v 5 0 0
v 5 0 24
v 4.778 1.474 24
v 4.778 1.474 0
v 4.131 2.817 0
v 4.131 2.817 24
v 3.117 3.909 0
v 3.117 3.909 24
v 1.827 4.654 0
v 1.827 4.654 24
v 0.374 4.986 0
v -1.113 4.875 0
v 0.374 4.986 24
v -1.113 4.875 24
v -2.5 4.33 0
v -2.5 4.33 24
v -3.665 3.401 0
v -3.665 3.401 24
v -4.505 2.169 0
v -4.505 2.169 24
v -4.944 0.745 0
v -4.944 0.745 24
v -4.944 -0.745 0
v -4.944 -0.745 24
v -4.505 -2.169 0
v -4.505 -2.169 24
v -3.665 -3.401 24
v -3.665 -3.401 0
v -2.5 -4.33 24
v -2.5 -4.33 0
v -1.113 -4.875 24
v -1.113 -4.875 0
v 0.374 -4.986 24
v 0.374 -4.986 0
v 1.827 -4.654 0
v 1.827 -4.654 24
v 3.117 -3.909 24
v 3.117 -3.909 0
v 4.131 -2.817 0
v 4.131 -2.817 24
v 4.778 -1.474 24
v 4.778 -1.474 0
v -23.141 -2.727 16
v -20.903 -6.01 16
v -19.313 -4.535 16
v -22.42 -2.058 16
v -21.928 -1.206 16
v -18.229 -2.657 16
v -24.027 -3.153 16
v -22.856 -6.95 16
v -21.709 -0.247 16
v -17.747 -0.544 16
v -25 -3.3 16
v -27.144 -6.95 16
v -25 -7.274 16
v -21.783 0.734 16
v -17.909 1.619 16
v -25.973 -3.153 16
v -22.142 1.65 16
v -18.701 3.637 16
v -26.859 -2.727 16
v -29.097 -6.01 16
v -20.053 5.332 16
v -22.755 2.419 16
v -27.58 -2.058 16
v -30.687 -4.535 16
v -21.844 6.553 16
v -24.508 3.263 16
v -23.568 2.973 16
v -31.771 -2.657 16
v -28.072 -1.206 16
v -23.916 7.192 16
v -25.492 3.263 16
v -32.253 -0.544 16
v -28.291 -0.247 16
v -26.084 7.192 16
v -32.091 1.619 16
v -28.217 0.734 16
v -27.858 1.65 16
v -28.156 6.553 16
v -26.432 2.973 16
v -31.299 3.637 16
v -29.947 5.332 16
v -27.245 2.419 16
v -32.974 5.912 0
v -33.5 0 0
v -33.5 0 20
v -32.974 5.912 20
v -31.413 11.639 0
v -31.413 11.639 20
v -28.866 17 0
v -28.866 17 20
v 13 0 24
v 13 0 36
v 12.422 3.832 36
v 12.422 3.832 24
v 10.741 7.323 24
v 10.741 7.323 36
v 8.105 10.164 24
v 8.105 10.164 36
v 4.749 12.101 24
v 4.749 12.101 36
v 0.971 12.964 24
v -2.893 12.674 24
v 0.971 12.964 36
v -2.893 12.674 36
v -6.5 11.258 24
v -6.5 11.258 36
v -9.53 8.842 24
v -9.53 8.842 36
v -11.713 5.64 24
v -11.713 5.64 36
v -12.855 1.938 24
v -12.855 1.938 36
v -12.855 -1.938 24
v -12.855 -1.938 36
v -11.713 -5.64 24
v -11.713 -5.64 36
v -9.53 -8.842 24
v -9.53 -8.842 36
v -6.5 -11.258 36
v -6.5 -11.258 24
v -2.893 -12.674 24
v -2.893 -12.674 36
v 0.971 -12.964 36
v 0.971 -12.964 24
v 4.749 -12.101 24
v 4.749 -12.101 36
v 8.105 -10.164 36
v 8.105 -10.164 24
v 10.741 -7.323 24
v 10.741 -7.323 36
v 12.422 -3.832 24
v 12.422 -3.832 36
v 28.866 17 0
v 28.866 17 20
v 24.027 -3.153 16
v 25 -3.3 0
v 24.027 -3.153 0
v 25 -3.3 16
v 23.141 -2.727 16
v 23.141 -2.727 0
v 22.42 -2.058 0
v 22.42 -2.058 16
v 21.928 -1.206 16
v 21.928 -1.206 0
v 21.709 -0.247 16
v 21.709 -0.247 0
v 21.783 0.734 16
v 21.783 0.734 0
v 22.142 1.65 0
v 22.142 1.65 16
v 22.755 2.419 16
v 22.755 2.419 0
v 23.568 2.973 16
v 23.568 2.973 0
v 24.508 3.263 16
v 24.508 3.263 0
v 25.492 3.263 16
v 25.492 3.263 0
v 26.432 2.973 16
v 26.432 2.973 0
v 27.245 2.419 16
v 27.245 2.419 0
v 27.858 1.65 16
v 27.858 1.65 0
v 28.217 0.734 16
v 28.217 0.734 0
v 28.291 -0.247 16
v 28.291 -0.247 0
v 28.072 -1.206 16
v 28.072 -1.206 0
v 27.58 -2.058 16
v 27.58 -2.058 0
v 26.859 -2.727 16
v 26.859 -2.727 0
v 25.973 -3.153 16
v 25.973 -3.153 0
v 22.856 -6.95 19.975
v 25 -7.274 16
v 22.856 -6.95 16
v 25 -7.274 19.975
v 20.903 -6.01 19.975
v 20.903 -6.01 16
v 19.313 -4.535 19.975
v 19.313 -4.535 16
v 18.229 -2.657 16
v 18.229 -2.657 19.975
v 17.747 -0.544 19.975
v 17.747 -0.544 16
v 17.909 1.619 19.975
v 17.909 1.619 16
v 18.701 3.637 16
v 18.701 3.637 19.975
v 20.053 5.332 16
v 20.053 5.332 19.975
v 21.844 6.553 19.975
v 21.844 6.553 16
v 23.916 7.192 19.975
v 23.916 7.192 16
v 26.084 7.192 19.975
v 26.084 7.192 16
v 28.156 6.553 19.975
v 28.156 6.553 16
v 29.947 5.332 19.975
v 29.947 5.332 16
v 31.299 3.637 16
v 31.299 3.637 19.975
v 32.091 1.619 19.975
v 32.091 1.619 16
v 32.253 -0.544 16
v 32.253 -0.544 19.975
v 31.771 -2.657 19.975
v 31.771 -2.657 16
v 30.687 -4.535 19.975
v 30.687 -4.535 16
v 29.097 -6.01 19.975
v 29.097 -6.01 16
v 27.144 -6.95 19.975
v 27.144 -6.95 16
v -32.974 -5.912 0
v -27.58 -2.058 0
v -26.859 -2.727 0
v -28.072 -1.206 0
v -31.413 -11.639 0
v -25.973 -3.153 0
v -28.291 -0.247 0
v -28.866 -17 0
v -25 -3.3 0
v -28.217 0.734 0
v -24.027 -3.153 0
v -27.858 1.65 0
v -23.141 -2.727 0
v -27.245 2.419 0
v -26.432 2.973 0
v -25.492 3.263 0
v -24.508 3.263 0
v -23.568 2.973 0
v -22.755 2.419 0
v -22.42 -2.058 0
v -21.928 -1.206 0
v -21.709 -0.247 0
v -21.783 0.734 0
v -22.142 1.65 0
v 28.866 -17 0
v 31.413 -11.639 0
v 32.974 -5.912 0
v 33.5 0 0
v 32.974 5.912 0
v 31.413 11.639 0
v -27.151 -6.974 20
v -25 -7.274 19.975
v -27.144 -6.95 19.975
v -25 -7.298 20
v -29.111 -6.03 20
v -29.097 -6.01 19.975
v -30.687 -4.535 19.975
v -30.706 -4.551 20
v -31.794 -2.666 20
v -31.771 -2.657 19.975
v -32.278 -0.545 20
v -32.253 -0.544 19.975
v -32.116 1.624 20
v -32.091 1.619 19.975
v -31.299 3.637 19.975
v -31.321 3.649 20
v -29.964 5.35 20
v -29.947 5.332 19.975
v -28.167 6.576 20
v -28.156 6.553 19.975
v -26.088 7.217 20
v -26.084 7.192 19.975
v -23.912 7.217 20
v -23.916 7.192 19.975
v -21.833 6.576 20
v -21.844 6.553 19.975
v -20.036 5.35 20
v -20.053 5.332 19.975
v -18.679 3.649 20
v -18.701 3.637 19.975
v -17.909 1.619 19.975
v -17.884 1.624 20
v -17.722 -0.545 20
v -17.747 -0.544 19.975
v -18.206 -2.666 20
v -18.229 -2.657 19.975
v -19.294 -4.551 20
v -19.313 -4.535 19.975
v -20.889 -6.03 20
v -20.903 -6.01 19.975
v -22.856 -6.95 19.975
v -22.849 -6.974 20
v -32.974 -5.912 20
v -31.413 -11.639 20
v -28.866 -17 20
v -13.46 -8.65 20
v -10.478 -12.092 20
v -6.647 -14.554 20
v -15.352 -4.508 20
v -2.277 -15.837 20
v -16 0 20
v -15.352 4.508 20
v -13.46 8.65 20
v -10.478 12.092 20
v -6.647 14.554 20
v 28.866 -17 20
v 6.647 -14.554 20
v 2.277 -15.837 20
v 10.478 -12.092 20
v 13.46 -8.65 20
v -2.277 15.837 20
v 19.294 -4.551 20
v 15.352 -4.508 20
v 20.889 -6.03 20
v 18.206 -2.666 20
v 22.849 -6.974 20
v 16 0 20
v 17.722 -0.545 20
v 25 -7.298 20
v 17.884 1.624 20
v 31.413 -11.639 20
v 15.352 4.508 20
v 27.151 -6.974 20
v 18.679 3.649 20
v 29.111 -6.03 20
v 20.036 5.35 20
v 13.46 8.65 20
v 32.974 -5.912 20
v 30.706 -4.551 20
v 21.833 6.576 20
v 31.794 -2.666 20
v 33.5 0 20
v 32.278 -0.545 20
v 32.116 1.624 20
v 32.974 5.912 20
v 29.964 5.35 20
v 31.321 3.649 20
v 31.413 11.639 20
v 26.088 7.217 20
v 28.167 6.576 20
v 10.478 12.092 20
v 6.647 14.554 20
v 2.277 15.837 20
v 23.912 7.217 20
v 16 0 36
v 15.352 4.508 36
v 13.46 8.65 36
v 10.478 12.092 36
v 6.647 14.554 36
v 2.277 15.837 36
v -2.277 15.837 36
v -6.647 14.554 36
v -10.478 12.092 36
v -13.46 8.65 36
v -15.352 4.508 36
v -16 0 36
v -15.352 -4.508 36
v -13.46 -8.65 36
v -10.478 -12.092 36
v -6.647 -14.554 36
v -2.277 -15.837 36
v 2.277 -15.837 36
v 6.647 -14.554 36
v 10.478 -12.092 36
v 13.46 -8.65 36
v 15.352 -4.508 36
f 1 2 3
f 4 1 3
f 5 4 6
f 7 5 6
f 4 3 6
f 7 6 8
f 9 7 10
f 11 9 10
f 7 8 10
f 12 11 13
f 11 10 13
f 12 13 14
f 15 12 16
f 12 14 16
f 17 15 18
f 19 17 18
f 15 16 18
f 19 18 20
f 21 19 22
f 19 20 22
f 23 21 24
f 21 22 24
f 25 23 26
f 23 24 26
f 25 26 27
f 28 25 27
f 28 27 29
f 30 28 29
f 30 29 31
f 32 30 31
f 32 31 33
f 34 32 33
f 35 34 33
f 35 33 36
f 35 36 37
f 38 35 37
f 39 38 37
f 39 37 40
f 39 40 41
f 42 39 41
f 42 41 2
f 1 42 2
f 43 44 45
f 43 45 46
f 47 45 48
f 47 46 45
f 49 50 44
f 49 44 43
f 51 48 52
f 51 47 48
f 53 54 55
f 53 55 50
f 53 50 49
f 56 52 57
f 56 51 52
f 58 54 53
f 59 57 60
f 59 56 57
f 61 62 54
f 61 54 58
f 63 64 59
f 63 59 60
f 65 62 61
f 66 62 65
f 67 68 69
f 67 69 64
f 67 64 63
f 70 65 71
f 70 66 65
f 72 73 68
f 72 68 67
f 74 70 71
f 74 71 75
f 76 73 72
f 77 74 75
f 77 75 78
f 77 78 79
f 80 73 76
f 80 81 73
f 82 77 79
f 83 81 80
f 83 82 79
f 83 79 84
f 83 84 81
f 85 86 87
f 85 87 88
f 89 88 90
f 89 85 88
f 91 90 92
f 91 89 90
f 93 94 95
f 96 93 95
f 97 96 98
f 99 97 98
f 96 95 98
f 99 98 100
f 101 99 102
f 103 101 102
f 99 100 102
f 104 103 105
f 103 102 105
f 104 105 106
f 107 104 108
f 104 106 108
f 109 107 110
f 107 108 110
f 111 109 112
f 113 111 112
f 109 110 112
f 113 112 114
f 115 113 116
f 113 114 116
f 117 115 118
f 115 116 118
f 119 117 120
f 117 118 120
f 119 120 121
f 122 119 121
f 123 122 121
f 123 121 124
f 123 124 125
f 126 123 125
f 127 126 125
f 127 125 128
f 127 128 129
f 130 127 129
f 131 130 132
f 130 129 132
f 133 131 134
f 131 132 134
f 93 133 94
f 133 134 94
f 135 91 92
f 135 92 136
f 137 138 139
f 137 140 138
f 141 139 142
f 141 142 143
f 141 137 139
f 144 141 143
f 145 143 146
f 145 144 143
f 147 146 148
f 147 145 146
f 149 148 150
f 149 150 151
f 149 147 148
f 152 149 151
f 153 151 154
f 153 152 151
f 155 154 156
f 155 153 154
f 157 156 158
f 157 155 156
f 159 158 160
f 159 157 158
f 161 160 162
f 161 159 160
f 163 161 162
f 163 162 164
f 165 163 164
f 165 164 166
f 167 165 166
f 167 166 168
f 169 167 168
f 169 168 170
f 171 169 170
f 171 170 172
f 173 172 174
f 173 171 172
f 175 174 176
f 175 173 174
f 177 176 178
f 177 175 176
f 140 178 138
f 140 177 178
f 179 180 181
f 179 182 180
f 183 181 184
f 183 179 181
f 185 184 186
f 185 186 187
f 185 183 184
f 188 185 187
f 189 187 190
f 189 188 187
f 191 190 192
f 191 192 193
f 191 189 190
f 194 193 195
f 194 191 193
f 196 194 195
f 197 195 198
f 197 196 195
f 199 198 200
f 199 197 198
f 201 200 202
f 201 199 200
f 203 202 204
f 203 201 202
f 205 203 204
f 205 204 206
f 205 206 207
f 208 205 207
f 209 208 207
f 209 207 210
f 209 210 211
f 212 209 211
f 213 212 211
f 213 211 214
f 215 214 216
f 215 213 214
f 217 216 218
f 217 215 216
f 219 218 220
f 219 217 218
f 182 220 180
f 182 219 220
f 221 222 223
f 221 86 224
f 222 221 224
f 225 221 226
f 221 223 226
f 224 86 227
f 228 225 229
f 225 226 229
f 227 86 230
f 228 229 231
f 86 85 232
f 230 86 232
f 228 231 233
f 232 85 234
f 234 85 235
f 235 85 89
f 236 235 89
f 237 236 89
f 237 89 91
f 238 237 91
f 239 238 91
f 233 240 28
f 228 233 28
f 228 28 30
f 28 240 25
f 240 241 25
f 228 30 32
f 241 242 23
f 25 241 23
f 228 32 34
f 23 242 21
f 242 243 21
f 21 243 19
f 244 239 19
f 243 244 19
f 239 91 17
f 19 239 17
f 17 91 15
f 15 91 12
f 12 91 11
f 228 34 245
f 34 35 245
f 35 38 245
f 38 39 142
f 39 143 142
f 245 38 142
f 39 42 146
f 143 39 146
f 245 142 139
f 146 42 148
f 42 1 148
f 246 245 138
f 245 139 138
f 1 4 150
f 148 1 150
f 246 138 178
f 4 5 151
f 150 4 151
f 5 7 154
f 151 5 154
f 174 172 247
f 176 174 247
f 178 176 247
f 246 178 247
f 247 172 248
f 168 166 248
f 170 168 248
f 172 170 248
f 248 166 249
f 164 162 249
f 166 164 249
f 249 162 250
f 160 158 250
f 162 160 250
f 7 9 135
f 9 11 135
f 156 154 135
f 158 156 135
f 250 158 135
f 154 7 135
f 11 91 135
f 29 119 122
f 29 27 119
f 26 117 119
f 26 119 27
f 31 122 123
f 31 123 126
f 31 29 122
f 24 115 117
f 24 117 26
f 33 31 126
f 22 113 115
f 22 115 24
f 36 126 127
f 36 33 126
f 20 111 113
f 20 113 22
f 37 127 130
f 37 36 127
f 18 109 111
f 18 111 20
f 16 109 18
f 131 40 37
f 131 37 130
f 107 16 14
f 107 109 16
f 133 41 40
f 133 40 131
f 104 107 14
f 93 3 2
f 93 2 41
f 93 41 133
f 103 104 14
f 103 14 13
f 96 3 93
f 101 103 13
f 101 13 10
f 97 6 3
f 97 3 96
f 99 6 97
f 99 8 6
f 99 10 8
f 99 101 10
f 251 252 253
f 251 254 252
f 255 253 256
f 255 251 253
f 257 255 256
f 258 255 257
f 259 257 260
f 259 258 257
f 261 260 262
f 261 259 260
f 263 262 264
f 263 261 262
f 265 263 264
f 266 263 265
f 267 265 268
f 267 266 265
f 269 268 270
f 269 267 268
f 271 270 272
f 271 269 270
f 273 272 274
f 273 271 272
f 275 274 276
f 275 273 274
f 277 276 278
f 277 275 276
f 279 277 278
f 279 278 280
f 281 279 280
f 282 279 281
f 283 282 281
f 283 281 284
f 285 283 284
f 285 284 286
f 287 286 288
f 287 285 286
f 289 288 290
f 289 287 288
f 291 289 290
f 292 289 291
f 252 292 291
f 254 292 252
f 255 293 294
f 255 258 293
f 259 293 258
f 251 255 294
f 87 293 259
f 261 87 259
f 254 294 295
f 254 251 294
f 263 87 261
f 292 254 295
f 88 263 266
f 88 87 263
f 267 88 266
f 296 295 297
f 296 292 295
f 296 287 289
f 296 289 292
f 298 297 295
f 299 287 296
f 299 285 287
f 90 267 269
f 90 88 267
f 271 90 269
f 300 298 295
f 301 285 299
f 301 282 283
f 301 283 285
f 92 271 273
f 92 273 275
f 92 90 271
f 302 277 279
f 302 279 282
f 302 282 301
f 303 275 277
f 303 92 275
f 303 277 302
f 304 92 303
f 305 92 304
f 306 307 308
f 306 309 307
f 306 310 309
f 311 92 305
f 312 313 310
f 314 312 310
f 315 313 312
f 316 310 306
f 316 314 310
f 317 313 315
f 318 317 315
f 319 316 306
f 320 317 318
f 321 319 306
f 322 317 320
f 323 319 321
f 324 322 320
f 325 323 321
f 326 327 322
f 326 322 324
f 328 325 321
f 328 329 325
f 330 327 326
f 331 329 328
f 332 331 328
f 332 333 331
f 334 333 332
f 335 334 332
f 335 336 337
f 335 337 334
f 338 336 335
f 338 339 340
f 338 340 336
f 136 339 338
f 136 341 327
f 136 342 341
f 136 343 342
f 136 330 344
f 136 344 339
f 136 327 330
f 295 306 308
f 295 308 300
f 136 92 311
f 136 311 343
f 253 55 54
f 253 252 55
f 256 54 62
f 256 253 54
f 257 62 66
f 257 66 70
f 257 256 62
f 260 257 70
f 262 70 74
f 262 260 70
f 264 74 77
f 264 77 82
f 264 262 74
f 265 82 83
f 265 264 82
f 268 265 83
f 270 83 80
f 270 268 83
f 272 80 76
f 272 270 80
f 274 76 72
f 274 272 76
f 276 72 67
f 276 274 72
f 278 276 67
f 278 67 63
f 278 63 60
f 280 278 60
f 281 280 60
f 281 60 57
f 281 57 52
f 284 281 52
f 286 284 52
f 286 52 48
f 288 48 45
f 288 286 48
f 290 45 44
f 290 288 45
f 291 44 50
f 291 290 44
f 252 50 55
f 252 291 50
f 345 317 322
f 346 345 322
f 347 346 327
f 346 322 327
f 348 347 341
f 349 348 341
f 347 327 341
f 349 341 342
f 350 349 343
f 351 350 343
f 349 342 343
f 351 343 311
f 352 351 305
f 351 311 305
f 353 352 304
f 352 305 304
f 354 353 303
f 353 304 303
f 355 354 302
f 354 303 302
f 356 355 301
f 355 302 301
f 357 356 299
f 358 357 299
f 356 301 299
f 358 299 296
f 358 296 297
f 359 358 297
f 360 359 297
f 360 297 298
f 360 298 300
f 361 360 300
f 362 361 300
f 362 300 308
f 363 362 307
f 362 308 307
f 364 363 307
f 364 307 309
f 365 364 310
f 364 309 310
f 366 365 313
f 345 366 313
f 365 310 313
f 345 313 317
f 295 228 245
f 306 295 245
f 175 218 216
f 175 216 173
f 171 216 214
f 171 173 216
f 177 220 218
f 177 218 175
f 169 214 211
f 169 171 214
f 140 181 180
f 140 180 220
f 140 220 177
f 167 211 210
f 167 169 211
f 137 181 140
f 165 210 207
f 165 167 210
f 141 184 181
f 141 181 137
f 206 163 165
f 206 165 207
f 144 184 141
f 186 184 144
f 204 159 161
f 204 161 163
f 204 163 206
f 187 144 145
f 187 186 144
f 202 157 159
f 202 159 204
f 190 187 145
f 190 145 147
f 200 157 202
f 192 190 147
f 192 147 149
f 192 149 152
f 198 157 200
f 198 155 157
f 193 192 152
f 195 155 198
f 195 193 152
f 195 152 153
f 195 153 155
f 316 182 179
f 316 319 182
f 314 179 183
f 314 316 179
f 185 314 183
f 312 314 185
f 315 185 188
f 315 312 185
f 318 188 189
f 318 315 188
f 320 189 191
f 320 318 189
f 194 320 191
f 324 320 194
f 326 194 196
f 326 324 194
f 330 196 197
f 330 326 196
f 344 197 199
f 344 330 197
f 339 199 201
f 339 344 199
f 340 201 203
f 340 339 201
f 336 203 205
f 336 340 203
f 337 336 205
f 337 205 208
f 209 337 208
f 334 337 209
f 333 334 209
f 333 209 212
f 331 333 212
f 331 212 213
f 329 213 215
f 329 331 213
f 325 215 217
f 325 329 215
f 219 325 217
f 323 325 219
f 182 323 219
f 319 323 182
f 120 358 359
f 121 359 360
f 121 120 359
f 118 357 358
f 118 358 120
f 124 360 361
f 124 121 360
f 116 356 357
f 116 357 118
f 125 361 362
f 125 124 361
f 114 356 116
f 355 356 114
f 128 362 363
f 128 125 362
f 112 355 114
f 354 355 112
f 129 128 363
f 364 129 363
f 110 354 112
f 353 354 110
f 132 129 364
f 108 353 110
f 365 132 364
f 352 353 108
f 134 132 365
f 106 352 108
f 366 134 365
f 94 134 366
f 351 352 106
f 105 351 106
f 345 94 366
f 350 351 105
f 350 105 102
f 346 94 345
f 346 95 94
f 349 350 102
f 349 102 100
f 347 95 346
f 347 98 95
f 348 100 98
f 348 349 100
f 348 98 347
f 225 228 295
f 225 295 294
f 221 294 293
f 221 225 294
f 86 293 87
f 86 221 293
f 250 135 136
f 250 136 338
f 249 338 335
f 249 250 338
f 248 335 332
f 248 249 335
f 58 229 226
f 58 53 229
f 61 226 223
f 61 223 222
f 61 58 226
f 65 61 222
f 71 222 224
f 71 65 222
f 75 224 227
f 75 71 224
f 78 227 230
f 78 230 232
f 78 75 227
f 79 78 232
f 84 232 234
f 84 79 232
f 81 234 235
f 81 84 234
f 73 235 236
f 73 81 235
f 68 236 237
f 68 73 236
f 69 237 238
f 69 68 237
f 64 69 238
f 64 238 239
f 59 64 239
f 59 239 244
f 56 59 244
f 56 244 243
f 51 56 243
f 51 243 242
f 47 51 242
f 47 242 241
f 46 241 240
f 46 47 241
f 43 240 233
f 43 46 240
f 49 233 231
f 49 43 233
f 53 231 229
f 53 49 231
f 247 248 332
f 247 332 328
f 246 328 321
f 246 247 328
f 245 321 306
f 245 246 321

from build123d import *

# Parameters (mm, degrees)
SKETCH1_W                              = 67
SKETCH1_H                              = 34
BOSS_EXTRUDE1_DEPTH                    = 20
CUT_EXTRUDE1_START                     = -20
CUT_EXTRUDE1_DEPTH                     = 20
SKETCH3_R                              = 16
BOSS_EXTRUDE2_DEPTH                    = 16
CBORE_FOR_M6_HEX_HEAD_BOLT1_AT_2_COUNT = 2
CBORE_FOR_M6_HEX_HEAD_BOLT1_AT_2_PITCH = 50
SKETCH9_R                              = 5
CUT_EXTRUDE2_DEPTH                     = 46
SKETCH10_R                             = 13
CUT_EXTRUDE3_DEPTH                     = 12


# Read off the part's stored shape, not the designer's step: Cut-Extrude1
with BuildPart() as part:
    # Sketch1 → Boss-Extrude1 (new body)
    with BuildSketch(Plane.XY):
        Rectangle(SKETCH1_W, SKETCH1_H)
    extrude(amount=BOSS_EXTRUDE1_DEPTH)

    # Cut-Extrude1 outline → Cut-Extrude1 (cut)
    with BuildSketch(Plane.XY.offset(20).offset(CUT_EXTRUDE1_START)):
        with BuildLine():
            ThreePointArc((-33.5, -3.1e-08), (-32.320762268, 8.810126358), (-28.866070048, 17))
            Line((-28.866070048, 17), (-33.5, 17))
            Line((-33.5, 17), (-33.5, -3.1e-08))
        make_face()
        with BuildLine():
            ThreePointArc((-28.866070048, -17), (-32.32076226, -8.810126387), (-33.5, -3.1e-08))
            Line((-33.5, -3.1e-08), (-33.5, -17))
            Line((-33.5, -17), (-28.866070048, -17))
        make_face()
        with BuildLine():
            Line((33.5, 17), (28.866070048, 17))
            ThreePointArc((28.866070048, 17), (32.32076226, 8.810126387), (33.5, 3.1e-08))
            Line((33.5, 3.1e-08), (33.5, 17))
        make_face()
        with BuildLine():
            Line((33.5, -17), (33.5, 3.1e-08))
            ThreePointArc((33.5, 3.1e-08), (32.320762268, -8.810126358), (28.866070048, -17))
            Line((28.866070048, -17), (33.5, -17))
        make_face()
    extrude(amount=CUT_EXTRUDE1_DEPTH, mode=Mode.SUBTRACT)

    # Sketch3 → Boss-Extrude2 (add)
    with BuildSketch(Plane.XY.offset(20)):
        Circle(SKETCH3_R)
    extrude(amount=BOSS_EXTRUDE2_DEPTH)

    # Sketch8 → CBORE for M6 Hex Head Bolt1 (revolve, cut)
    with BuildSketch(Plane(origin=(-25, 0, 20), x_dir=(0, -1, 0), z_dir=(1, 0, 0))):
        Polygon((0, 0), (0, 20), (3.3, 20), (3.3, 4), (7.2735, 4), (7.2735, 0.025), (7.2985, 0), align=None)
    cbore_for_m6_hex_head_bolt1 = revolve(axis=Axis((-25, 0, 26.35), (0, 0, -1)), mode=Mode.SUBTRACT)

    # CBORE for M6 Hex Head Bolt1 at 2: CBORE for M6 Hex Head Bolt1 ×2
    with Locations(*[(i * CBORE_FOR_M6_HEX_HEAD_BOLT1_AT_2_PITCH, 0, 0) for i in range(1, CBORE_FOR_M6_HEX_HEAD_BOLT1_AT_2_COUNT)]):
        add(cbore_for_m6_hex_head_bolt1, mode=Mode.SUBTRACT)

    # Sketch9 → Cut-Extrude2 (cut)
    with BuildSketch(Plane.XY.offset(36)):
        Circle(SKETCH9_R)
    extrude(amount=-CUT_EXTRUDE2_DEPTH, mode=Mode.SUBTRACT)

    # Sketch10 → Cut-Extrude3 (cut)
    with BuildSketch(Plane.XY.offset(36)):
        Circle(SKETCH10_R)
    extrude(amount=-CUT_EXTRUDE3_DEPTH, mode=Mode.SUBTRACT)


solid = part.part
